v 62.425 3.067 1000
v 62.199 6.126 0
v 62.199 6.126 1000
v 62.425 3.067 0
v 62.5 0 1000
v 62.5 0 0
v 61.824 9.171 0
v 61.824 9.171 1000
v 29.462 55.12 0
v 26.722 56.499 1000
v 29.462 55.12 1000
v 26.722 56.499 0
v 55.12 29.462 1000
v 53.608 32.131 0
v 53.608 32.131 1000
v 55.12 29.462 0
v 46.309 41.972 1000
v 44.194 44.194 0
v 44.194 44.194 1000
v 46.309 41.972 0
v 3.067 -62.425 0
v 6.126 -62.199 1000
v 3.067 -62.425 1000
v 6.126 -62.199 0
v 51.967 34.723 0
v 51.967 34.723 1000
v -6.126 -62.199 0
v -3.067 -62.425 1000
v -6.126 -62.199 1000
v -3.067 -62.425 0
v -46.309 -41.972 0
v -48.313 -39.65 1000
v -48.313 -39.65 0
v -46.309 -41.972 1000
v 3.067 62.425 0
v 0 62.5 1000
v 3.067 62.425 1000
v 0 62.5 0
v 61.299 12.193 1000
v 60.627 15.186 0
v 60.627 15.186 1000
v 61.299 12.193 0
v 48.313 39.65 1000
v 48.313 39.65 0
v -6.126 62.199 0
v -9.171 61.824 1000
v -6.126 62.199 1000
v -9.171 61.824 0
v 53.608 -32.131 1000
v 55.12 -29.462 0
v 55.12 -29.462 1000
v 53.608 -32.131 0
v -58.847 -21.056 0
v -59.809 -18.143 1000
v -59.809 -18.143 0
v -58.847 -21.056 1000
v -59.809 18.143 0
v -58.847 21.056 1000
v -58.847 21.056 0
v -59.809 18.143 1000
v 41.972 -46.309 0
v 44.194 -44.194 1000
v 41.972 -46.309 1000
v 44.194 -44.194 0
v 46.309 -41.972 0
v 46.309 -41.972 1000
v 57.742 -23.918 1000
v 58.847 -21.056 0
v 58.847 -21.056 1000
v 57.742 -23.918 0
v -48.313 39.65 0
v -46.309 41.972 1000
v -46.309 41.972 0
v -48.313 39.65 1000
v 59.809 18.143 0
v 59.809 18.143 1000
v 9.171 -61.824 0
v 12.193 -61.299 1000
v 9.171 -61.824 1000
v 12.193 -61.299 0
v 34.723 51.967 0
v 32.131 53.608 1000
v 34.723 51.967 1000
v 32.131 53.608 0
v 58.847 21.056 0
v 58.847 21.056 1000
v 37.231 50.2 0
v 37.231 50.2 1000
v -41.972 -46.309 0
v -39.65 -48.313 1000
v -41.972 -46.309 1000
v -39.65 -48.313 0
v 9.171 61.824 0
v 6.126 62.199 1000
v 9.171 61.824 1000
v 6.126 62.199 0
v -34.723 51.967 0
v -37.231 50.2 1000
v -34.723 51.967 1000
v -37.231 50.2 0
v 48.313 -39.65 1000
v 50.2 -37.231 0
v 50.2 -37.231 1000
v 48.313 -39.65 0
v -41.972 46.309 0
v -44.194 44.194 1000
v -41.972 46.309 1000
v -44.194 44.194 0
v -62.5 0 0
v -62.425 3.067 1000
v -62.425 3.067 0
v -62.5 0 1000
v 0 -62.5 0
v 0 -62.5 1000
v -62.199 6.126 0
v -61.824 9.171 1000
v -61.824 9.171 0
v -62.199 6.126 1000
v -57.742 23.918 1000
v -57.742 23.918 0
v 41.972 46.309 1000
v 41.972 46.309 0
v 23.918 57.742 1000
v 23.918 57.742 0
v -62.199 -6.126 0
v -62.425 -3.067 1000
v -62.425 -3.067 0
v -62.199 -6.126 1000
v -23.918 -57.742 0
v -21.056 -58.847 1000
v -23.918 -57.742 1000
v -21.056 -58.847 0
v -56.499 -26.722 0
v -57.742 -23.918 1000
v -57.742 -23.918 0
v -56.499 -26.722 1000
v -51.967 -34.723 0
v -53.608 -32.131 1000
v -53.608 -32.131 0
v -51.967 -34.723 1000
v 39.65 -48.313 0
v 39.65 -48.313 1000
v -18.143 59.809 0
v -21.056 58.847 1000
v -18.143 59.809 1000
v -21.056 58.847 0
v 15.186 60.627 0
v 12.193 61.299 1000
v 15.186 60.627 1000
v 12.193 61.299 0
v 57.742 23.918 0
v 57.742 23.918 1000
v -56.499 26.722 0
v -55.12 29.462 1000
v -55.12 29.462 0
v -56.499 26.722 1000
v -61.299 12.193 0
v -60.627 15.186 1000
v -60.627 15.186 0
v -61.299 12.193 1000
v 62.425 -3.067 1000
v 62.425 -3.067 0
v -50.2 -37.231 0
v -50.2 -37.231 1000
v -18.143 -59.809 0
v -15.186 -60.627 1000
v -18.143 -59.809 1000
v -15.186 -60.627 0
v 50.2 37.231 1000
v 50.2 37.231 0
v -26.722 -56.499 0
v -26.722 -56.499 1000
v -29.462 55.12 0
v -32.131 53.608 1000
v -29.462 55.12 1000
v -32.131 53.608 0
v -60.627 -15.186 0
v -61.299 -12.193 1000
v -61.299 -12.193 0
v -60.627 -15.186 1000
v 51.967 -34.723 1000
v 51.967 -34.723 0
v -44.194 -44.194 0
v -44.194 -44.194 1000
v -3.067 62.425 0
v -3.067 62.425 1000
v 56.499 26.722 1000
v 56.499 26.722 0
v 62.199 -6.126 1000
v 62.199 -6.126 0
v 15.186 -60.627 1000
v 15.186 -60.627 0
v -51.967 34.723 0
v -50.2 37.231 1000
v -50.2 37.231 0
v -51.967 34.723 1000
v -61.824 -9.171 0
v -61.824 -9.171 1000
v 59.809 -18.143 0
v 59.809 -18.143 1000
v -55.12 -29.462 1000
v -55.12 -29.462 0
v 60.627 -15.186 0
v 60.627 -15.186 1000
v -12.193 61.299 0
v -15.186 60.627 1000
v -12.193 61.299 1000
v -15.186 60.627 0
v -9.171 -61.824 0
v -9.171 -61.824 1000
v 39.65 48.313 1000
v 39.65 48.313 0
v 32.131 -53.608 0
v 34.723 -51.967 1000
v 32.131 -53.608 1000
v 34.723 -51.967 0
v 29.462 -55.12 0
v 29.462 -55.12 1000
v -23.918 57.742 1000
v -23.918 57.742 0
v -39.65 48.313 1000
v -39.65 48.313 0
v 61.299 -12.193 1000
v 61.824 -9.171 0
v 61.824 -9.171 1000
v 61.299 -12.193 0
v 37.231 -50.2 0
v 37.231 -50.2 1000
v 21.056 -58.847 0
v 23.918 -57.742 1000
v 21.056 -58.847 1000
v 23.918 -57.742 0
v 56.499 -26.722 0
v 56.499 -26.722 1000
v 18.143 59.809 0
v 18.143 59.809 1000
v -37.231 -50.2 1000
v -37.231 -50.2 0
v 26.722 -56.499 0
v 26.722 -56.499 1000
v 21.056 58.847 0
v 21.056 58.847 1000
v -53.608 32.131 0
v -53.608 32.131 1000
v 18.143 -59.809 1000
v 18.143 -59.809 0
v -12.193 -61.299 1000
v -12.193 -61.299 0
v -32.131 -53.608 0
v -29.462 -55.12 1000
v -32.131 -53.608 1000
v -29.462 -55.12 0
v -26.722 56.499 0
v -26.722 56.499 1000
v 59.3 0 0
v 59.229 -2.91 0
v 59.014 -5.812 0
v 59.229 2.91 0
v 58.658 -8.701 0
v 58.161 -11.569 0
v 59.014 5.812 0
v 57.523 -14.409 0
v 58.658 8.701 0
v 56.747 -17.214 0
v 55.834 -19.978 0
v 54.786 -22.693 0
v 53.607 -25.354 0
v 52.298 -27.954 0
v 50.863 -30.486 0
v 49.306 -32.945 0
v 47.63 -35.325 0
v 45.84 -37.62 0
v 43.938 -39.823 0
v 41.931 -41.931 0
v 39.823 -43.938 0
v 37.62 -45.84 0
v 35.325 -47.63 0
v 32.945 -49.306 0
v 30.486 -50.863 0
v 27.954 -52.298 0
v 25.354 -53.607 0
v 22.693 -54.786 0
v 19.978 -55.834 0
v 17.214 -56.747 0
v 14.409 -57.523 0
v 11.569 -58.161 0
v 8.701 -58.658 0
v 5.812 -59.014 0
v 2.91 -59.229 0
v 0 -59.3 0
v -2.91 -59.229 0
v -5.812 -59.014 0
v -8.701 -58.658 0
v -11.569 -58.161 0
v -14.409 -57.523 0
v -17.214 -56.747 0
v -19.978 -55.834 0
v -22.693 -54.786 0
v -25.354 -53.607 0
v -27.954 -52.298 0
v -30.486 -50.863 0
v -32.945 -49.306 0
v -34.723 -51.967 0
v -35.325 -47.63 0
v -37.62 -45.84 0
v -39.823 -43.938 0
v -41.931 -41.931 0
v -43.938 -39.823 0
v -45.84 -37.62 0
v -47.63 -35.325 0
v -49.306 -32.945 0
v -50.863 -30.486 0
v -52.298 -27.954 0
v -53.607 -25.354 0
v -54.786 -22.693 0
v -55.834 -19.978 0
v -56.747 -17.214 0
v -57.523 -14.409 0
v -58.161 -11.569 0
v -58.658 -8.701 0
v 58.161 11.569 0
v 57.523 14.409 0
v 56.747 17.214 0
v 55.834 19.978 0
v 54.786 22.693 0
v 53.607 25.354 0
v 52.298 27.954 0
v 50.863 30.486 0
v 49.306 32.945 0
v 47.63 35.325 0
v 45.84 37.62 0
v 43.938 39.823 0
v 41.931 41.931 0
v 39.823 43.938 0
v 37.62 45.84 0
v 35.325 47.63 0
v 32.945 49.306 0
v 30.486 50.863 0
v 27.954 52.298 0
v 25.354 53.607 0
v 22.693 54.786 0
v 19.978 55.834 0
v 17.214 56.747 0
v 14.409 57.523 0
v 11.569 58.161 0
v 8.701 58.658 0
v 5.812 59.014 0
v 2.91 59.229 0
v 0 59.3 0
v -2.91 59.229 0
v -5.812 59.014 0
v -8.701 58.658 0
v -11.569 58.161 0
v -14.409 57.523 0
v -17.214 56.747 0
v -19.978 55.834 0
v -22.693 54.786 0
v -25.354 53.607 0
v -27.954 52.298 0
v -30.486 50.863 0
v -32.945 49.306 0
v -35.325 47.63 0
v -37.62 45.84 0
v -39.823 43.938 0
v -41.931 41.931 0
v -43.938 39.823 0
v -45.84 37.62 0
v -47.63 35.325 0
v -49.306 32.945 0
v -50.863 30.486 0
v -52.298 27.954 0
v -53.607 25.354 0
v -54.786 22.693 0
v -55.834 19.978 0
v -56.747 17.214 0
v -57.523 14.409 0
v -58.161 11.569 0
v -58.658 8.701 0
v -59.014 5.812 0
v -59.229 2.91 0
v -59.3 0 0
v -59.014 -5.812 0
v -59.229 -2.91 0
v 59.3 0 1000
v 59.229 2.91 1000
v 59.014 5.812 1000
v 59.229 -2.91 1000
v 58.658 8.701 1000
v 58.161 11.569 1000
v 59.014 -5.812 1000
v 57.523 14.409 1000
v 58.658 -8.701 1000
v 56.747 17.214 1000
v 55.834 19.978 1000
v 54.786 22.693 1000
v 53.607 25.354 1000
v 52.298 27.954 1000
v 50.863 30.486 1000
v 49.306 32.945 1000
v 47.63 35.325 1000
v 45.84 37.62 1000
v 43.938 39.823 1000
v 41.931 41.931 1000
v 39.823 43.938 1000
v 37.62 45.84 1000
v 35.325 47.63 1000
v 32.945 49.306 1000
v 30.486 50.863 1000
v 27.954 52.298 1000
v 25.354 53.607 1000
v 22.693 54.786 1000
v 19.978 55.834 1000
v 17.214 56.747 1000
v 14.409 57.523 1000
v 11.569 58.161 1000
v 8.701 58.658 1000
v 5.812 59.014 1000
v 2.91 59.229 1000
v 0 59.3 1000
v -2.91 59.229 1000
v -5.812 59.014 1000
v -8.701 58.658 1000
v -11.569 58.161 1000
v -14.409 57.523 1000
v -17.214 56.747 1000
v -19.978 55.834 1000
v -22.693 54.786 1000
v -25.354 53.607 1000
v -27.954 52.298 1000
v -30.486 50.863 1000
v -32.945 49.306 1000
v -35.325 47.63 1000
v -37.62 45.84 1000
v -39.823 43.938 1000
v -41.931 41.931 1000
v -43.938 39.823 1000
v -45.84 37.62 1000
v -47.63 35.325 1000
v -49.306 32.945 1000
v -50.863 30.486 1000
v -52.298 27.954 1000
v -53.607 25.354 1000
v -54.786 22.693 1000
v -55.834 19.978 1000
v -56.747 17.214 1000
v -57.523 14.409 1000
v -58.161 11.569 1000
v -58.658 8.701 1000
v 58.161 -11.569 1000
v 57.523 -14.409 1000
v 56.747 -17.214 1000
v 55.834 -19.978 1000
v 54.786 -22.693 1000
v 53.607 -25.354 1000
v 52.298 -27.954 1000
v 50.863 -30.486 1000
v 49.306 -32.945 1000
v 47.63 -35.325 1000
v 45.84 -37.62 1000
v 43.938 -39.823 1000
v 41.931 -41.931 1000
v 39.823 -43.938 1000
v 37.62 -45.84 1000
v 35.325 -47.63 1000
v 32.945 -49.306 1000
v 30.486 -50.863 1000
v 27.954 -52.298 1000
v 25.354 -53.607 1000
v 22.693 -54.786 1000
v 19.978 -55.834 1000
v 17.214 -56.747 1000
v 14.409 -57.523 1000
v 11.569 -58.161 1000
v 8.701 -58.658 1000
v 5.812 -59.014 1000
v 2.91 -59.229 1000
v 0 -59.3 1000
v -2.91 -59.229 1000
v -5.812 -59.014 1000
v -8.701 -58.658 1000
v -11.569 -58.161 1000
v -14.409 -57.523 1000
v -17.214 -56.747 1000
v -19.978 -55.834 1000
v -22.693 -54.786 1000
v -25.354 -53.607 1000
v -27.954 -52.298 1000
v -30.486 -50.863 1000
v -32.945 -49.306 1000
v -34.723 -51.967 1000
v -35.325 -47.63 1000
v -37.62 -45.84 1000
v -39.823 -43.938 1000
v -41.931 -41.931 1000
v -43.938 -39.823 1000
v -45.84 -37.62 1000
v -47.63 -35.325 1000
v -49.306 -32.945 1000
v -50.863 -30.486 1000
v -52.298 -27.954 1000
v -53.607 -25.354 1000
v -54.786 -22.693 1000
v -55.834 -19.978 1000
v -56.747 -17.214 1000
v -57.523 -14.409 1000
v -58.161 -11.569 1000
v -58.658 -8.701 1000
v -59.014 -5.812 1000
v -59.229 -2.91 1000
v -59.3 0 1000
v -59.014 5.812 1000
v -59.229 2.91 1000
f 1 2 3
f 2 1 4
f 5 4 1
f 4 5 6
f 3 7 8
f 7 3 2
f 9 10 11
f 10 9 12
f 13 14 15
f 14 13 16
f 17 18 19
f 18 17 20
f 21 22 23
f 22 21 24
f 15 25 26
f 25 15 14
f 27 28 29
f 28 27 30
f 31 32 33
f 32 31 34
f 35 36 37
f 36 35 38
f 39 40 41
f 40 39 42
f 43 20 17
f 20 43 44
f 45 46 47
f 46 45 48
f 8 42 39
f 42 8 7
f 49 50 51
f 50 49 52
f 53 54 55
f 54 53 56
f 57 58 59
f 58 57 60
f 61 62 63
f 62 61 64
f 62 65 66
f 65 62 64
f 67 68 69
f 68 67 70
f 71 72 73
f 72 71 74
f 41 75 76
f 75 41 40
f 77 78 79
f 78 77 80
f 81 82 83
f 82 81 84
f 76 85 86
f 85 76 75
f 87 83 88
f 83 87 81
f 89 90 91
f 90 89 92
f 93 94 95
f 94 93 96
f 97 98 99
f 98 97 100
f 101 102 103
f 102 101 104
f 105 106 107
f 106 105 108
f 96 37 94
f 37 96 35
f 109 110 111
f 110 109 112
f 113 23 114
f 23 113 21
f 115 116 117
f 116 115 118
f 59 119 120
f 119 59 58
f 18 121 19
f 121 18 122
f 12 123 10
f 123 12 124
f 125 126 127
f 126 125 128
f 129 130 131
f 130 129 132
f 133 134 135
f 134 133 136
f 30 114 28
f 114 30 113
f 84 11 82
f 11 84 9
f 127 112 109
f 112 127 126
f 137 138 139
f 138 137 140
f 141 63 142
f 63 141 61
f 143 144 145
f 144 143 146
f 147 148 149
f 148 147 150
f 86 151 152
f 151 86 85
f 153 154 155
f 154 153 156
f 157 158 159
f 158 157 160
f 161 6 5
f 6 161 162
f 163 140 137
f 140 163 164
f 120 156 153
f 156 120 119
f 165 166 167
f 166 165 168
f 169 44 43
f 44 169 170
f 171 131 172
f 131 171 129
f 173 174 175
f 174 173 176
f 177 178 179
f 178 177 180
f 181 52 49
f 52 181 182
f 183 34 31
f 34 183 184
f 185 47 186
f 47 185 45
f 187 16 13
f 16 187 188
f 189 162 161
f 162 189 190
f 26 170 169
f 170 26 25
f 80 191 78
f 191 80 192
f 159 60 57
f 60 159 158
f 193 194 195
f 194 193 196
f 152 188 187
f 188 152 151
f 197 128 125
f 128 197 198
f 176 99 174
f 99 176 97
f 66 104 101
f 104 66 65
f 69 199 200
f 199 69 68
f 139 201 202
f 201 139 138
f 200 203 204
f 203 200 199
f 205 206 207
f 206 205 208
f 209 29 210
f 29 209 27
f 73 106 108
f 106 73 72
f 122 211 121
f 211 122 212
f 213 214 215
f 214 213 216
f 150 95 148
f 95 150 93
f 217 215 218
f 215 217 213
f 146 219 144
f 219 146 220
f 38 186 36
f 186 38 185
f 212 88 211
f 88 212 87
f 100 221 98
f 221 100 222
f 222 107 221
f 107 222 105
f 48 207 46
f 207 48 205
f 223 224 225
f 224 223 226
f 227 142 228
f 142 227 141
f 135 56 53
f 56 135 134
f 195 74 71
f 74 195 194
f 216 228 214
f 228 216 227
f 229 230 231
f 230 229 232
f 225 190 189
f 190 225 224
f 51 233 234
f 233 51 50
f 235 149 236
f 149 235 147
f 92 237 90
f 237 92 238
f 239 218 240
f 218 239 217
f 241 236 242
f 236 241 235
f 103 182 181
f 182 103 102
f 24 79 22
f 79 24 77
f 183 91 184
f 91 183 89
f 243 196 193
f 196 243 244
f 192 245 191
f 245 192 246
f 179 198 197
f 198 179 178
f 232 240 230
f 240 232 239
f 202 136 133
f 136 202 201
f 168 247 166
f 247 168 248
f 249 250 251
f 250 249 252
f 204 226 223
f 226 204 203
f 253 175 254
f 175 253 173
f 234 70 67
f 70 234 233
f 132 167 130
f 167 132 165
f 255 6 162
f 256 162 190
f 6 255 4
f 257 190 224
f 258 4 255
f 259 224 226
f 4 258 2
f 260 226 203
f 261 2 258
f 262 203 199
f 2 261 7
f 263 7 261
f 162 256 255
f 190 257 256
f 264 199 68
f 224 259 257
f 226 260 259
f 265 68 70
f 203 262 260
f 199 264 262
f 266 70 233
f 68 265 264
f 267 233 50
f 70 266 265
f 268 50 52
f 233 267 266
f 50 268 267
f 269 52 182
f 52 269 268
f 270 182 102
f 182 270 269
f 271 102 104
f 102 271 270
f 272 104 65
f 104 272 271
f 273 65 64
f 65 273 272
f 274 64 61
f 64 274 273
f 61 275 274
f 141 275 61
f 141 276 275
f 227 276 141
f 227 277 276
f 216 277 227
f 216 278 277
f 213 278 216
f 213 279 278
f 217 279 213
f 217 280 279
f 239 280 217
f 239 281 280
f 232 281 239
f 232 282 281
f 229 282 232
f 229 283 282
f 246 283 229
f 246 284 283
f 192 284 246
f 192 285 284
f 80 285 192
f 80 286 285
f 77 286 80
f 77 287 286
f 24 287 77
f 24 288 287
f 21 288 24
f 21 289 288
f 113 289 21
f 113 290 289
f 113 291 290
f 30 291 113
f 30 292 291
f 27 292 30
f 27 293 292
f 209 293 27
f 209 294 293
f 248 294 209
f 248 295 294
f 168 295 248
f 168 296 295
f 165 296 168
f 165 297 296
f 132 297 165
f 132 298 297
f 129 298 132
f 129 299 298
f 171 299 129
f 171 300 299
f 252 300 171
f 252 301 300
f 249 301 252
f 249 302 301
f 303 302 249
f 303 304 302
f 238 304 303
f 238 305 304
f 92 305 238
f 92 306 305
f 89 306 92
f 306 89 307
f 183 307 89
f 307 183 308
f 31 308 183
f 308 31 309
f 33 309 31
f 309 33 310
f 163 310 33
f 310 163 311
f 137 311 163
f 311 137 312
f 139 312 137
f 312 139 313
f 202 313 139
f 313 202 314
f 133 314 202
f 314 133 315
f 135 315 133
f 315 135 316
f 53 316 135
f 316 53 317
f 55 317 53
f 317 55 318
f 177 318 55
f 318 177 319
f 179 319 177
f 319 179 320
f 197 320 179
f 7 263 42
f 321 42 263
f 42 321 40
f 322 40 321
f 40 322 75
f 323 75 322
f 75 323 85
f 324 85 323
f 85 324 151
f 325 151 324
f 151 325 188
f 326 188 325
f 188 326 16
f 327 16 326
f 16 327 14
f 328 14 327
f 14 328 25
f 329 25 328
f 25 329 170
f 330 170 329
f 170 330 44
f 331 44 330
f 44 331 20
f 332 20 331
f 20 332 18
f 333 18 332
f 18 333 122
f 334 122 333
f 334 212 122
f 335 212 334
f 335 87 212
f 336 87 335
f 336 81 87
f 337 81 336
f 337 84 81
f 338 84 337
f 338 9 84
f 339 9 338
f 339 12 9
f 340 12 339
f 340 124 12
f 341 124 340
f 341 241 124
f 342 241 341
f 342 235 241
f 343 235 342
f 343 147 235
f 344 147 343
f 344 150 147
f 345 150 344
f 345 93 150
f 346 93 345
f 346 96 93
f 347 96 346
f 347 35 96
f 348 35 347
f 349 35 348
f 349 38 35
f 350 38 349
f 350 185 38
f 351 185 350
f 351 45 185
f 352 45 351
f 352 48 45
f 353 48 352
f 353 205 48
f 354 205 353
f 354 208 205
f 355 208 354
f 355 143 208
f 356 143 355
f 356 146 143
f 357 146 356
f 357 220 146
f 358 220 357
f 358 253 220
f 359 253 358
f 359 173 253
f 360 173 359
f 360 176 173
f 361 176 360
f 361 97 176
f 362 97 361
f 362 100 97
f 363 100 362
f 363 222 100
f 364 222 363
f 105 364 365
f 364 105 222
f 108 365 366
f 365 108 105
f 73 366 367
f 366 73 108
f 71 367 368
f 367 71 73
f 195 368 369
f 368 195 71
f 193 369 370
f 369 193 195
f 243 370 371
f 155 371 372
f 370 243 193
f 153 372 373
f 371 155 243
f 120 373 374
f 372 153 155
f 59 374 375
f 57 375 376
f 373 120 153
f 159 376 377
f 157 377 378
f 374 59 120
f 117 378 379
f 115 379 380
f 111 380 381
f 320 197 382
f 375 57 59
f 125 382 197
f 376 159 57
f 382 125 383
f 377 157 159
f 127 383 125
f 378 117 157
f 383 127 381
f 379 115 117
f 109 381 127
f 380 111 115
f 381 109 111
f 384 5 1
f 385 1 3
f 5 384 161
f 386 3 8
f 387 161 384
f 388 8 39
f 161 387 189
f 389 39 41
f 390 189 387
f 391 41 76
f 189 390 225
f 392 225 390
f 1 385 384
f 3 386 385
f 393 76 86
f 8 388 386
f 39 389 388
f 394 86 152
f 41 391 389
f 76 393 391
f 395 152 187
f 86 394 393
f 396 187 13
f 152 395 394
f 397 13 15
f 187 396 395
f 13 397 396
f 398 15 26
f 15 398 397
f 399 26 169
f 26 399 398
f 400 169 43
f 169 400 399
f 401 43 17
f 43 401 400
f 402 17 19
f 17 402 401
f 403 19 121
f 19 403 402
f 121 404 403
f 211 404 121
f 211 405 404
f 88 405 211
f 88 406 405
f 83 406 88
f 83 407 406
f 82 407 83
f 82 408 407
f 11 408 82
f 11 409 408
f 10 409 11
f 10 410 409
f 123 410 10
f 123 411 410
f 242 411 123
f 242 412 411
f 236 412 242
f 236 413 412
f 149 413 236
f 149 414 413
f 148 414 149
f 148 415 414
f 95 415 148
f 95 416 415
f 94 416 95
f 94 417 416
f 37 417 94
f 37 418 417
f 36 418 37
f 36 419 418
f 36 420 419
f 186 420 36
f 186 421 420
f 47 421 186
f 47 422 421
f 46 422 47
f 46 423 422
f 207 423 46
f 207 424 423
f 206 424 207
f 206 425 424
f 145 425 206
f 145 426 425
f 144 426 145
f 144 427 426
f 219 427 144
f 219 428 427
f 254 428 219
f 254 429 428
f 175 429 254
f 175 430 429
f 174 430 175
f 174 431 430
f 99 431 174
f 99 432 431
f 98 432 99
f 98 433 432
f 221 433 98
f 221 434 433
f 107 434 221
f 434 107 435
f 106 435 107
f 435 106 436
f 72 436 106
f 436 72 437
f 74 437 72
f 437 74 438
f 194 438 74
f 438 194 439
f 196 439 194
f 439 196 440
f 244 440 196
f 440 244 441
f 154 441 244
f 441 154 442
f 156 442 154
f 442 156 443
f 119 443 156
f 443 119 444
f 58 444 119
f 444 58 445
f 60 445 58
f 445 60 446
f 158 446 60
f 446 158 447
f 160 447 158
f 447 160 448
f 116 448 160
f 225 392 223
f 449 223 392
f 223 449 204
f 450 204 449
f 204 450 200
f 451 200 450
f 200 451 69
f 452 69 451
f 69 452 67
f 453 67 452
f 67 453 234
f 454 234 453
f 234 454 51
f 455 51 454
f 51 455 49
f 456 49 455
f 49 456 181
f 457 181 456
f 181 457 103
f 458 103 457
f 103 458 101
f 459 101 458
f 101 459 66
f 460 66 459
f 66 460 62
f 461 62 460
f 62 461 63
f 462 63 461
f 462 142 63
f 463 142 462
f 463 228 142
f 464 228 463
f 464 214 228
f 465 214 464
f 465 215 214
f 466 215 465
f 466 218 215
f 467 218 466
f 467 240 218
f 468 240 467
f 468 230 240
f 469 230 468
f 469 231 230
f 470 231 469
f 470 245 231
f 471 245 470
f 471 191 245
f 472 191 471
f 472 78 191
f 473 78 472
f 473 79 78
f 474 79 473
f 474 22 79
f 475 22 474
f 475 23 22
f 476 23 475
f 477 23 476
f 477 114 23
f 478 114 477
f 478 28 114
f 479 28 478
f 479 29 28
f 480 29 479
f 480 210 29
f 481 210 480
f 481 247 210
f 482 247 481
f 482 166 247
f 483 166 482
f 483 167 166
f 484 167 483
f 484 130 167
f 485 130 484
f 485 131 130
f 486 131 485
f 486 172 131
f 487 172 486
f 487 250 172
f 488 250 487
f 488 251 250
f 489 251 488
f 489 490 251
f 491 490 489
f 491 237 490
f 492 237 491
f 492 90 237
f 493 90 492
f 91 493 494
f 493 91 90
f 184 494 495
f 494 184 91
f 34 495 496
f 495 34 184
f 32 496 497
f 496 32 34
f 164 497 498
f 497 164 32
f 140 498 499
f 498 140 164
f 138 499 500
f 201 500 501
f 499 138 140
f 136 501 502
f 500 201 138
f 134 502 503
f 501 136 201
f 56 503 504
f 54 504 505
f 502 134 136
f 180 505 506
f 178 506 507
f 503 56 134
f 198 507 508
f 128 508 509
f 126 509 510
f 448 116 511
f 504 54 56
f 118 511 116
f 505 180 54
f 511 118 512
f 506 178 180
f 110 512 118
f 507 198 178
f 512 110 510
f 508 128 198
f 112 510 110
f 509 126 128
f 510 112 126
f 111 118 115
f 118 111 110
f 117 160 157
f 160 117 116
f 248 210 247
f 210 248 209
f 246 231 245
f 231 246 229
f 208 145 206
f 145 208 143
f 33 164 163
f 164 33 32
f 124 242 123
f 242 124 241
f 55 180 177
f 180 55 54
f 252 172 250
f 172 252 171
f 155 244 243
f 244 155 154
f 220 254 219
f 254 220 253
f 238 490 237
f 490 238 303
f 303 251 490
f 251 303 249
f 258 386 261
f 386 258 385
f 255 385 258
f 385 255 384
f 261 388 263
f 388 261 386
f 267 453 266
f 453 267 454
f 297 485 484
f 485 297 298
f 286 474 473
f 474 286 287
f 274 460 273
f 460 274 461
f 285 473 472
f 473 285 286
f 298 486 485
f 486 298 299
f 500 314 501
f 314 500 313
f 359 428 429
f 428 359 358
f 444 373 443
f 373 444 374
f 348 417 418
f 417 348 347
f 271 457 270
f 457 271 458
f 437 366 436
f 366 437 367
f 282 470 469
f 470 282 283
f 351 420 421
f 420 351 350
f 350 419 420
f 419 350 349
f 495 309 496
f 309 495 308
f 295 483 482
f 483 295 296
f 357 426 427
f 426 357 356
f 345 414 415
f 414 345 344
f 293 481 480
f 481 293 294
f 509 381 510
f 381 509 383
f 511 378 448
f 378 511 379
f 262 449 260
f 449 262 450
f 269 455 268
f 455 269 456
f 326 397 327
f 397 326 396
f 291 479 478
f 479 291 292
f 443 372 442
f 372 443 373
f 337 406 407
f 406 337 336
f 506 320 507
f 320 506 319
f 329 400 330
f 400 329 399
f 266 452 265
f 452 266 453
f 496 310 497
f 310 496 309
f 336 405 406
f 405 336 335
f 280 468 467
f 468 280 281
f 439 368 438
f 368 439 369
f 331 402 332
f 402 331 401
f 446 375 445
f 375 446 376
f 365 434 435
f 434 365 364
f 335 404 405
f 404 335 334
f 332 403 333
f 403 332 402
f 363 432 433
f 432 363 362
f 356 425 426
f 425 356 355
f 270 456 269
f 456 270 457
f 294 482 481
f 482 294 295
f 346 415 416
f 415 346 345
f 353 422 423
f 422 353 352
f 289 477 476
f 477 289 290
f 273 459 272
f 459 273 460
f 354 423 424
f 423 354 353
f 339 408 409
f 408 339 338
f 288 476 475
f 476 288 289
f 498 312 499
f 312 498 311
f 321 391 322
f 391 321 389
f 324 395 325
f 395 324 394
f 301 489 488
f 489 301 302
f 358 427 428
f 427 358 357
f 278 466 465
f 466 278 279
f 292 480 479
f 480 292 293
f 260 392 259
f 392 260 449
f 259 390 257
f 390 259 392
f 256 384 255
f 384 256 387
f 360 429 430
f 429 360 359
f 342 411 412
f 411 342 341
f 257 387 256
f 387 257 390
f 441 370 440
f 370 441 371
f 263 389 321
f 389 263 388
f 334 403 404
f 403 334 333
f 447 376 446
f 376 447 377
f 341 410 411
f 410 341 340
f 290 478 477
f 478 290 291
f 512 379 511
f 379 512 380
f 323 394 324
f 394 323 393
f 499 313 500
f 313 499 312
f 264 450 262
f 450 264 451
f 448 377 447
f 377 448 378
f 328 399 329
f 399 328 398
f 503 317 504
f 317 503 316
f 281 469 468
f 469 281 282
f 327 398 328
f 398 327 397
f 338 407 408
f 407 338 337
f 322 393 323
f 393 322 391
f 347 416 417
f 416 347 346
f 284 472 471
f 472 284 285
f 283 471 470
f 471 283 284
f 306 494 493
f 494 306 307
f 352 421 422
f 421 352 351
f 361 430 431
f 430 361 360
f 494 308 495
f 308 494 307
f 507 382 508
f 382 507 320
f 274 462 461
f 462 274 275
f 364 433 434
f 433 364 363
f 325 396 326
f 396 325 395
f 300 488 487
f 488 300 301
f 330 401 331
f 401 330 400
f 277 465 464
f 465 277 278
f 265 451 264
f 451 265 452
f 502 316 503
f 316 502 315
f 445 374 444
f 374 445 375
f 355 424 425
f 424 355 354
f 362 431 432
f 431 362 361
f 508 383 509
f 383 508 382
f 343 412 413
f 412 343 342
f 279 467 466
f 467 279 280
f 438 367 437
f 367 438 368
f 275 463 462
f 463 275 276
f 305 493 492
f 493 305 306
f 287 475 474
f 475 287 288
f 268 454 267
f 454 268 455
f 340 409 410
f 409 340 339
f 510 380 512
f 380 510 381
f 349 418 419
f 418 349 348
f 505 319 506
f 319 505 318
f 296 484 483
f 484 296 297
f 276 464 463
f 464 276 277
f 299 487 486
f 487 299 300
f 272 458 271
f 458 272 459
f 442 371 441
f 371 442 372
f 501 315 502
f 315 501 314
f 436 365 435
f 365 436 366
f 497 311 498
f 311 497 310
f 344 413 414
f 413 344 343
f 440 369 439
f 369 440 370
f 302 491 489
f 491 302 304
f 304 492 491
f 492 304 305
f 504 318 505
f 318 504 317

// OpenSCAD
$fn = 128;

// HT pipe parameters (approximate for HT 125)
od = 125;          // outer diameter (mm)
wall = 3.2;        // wall thickness (mm) typical for HT DN125
len = 1000;        // length (mm)

id = od - 2*wall;

difference() {
    cylinder(h = len, d = od, center = false);
    translate([0,0,-0.5])
        cylinder(h = len + 1, d = id, center = false);
}
